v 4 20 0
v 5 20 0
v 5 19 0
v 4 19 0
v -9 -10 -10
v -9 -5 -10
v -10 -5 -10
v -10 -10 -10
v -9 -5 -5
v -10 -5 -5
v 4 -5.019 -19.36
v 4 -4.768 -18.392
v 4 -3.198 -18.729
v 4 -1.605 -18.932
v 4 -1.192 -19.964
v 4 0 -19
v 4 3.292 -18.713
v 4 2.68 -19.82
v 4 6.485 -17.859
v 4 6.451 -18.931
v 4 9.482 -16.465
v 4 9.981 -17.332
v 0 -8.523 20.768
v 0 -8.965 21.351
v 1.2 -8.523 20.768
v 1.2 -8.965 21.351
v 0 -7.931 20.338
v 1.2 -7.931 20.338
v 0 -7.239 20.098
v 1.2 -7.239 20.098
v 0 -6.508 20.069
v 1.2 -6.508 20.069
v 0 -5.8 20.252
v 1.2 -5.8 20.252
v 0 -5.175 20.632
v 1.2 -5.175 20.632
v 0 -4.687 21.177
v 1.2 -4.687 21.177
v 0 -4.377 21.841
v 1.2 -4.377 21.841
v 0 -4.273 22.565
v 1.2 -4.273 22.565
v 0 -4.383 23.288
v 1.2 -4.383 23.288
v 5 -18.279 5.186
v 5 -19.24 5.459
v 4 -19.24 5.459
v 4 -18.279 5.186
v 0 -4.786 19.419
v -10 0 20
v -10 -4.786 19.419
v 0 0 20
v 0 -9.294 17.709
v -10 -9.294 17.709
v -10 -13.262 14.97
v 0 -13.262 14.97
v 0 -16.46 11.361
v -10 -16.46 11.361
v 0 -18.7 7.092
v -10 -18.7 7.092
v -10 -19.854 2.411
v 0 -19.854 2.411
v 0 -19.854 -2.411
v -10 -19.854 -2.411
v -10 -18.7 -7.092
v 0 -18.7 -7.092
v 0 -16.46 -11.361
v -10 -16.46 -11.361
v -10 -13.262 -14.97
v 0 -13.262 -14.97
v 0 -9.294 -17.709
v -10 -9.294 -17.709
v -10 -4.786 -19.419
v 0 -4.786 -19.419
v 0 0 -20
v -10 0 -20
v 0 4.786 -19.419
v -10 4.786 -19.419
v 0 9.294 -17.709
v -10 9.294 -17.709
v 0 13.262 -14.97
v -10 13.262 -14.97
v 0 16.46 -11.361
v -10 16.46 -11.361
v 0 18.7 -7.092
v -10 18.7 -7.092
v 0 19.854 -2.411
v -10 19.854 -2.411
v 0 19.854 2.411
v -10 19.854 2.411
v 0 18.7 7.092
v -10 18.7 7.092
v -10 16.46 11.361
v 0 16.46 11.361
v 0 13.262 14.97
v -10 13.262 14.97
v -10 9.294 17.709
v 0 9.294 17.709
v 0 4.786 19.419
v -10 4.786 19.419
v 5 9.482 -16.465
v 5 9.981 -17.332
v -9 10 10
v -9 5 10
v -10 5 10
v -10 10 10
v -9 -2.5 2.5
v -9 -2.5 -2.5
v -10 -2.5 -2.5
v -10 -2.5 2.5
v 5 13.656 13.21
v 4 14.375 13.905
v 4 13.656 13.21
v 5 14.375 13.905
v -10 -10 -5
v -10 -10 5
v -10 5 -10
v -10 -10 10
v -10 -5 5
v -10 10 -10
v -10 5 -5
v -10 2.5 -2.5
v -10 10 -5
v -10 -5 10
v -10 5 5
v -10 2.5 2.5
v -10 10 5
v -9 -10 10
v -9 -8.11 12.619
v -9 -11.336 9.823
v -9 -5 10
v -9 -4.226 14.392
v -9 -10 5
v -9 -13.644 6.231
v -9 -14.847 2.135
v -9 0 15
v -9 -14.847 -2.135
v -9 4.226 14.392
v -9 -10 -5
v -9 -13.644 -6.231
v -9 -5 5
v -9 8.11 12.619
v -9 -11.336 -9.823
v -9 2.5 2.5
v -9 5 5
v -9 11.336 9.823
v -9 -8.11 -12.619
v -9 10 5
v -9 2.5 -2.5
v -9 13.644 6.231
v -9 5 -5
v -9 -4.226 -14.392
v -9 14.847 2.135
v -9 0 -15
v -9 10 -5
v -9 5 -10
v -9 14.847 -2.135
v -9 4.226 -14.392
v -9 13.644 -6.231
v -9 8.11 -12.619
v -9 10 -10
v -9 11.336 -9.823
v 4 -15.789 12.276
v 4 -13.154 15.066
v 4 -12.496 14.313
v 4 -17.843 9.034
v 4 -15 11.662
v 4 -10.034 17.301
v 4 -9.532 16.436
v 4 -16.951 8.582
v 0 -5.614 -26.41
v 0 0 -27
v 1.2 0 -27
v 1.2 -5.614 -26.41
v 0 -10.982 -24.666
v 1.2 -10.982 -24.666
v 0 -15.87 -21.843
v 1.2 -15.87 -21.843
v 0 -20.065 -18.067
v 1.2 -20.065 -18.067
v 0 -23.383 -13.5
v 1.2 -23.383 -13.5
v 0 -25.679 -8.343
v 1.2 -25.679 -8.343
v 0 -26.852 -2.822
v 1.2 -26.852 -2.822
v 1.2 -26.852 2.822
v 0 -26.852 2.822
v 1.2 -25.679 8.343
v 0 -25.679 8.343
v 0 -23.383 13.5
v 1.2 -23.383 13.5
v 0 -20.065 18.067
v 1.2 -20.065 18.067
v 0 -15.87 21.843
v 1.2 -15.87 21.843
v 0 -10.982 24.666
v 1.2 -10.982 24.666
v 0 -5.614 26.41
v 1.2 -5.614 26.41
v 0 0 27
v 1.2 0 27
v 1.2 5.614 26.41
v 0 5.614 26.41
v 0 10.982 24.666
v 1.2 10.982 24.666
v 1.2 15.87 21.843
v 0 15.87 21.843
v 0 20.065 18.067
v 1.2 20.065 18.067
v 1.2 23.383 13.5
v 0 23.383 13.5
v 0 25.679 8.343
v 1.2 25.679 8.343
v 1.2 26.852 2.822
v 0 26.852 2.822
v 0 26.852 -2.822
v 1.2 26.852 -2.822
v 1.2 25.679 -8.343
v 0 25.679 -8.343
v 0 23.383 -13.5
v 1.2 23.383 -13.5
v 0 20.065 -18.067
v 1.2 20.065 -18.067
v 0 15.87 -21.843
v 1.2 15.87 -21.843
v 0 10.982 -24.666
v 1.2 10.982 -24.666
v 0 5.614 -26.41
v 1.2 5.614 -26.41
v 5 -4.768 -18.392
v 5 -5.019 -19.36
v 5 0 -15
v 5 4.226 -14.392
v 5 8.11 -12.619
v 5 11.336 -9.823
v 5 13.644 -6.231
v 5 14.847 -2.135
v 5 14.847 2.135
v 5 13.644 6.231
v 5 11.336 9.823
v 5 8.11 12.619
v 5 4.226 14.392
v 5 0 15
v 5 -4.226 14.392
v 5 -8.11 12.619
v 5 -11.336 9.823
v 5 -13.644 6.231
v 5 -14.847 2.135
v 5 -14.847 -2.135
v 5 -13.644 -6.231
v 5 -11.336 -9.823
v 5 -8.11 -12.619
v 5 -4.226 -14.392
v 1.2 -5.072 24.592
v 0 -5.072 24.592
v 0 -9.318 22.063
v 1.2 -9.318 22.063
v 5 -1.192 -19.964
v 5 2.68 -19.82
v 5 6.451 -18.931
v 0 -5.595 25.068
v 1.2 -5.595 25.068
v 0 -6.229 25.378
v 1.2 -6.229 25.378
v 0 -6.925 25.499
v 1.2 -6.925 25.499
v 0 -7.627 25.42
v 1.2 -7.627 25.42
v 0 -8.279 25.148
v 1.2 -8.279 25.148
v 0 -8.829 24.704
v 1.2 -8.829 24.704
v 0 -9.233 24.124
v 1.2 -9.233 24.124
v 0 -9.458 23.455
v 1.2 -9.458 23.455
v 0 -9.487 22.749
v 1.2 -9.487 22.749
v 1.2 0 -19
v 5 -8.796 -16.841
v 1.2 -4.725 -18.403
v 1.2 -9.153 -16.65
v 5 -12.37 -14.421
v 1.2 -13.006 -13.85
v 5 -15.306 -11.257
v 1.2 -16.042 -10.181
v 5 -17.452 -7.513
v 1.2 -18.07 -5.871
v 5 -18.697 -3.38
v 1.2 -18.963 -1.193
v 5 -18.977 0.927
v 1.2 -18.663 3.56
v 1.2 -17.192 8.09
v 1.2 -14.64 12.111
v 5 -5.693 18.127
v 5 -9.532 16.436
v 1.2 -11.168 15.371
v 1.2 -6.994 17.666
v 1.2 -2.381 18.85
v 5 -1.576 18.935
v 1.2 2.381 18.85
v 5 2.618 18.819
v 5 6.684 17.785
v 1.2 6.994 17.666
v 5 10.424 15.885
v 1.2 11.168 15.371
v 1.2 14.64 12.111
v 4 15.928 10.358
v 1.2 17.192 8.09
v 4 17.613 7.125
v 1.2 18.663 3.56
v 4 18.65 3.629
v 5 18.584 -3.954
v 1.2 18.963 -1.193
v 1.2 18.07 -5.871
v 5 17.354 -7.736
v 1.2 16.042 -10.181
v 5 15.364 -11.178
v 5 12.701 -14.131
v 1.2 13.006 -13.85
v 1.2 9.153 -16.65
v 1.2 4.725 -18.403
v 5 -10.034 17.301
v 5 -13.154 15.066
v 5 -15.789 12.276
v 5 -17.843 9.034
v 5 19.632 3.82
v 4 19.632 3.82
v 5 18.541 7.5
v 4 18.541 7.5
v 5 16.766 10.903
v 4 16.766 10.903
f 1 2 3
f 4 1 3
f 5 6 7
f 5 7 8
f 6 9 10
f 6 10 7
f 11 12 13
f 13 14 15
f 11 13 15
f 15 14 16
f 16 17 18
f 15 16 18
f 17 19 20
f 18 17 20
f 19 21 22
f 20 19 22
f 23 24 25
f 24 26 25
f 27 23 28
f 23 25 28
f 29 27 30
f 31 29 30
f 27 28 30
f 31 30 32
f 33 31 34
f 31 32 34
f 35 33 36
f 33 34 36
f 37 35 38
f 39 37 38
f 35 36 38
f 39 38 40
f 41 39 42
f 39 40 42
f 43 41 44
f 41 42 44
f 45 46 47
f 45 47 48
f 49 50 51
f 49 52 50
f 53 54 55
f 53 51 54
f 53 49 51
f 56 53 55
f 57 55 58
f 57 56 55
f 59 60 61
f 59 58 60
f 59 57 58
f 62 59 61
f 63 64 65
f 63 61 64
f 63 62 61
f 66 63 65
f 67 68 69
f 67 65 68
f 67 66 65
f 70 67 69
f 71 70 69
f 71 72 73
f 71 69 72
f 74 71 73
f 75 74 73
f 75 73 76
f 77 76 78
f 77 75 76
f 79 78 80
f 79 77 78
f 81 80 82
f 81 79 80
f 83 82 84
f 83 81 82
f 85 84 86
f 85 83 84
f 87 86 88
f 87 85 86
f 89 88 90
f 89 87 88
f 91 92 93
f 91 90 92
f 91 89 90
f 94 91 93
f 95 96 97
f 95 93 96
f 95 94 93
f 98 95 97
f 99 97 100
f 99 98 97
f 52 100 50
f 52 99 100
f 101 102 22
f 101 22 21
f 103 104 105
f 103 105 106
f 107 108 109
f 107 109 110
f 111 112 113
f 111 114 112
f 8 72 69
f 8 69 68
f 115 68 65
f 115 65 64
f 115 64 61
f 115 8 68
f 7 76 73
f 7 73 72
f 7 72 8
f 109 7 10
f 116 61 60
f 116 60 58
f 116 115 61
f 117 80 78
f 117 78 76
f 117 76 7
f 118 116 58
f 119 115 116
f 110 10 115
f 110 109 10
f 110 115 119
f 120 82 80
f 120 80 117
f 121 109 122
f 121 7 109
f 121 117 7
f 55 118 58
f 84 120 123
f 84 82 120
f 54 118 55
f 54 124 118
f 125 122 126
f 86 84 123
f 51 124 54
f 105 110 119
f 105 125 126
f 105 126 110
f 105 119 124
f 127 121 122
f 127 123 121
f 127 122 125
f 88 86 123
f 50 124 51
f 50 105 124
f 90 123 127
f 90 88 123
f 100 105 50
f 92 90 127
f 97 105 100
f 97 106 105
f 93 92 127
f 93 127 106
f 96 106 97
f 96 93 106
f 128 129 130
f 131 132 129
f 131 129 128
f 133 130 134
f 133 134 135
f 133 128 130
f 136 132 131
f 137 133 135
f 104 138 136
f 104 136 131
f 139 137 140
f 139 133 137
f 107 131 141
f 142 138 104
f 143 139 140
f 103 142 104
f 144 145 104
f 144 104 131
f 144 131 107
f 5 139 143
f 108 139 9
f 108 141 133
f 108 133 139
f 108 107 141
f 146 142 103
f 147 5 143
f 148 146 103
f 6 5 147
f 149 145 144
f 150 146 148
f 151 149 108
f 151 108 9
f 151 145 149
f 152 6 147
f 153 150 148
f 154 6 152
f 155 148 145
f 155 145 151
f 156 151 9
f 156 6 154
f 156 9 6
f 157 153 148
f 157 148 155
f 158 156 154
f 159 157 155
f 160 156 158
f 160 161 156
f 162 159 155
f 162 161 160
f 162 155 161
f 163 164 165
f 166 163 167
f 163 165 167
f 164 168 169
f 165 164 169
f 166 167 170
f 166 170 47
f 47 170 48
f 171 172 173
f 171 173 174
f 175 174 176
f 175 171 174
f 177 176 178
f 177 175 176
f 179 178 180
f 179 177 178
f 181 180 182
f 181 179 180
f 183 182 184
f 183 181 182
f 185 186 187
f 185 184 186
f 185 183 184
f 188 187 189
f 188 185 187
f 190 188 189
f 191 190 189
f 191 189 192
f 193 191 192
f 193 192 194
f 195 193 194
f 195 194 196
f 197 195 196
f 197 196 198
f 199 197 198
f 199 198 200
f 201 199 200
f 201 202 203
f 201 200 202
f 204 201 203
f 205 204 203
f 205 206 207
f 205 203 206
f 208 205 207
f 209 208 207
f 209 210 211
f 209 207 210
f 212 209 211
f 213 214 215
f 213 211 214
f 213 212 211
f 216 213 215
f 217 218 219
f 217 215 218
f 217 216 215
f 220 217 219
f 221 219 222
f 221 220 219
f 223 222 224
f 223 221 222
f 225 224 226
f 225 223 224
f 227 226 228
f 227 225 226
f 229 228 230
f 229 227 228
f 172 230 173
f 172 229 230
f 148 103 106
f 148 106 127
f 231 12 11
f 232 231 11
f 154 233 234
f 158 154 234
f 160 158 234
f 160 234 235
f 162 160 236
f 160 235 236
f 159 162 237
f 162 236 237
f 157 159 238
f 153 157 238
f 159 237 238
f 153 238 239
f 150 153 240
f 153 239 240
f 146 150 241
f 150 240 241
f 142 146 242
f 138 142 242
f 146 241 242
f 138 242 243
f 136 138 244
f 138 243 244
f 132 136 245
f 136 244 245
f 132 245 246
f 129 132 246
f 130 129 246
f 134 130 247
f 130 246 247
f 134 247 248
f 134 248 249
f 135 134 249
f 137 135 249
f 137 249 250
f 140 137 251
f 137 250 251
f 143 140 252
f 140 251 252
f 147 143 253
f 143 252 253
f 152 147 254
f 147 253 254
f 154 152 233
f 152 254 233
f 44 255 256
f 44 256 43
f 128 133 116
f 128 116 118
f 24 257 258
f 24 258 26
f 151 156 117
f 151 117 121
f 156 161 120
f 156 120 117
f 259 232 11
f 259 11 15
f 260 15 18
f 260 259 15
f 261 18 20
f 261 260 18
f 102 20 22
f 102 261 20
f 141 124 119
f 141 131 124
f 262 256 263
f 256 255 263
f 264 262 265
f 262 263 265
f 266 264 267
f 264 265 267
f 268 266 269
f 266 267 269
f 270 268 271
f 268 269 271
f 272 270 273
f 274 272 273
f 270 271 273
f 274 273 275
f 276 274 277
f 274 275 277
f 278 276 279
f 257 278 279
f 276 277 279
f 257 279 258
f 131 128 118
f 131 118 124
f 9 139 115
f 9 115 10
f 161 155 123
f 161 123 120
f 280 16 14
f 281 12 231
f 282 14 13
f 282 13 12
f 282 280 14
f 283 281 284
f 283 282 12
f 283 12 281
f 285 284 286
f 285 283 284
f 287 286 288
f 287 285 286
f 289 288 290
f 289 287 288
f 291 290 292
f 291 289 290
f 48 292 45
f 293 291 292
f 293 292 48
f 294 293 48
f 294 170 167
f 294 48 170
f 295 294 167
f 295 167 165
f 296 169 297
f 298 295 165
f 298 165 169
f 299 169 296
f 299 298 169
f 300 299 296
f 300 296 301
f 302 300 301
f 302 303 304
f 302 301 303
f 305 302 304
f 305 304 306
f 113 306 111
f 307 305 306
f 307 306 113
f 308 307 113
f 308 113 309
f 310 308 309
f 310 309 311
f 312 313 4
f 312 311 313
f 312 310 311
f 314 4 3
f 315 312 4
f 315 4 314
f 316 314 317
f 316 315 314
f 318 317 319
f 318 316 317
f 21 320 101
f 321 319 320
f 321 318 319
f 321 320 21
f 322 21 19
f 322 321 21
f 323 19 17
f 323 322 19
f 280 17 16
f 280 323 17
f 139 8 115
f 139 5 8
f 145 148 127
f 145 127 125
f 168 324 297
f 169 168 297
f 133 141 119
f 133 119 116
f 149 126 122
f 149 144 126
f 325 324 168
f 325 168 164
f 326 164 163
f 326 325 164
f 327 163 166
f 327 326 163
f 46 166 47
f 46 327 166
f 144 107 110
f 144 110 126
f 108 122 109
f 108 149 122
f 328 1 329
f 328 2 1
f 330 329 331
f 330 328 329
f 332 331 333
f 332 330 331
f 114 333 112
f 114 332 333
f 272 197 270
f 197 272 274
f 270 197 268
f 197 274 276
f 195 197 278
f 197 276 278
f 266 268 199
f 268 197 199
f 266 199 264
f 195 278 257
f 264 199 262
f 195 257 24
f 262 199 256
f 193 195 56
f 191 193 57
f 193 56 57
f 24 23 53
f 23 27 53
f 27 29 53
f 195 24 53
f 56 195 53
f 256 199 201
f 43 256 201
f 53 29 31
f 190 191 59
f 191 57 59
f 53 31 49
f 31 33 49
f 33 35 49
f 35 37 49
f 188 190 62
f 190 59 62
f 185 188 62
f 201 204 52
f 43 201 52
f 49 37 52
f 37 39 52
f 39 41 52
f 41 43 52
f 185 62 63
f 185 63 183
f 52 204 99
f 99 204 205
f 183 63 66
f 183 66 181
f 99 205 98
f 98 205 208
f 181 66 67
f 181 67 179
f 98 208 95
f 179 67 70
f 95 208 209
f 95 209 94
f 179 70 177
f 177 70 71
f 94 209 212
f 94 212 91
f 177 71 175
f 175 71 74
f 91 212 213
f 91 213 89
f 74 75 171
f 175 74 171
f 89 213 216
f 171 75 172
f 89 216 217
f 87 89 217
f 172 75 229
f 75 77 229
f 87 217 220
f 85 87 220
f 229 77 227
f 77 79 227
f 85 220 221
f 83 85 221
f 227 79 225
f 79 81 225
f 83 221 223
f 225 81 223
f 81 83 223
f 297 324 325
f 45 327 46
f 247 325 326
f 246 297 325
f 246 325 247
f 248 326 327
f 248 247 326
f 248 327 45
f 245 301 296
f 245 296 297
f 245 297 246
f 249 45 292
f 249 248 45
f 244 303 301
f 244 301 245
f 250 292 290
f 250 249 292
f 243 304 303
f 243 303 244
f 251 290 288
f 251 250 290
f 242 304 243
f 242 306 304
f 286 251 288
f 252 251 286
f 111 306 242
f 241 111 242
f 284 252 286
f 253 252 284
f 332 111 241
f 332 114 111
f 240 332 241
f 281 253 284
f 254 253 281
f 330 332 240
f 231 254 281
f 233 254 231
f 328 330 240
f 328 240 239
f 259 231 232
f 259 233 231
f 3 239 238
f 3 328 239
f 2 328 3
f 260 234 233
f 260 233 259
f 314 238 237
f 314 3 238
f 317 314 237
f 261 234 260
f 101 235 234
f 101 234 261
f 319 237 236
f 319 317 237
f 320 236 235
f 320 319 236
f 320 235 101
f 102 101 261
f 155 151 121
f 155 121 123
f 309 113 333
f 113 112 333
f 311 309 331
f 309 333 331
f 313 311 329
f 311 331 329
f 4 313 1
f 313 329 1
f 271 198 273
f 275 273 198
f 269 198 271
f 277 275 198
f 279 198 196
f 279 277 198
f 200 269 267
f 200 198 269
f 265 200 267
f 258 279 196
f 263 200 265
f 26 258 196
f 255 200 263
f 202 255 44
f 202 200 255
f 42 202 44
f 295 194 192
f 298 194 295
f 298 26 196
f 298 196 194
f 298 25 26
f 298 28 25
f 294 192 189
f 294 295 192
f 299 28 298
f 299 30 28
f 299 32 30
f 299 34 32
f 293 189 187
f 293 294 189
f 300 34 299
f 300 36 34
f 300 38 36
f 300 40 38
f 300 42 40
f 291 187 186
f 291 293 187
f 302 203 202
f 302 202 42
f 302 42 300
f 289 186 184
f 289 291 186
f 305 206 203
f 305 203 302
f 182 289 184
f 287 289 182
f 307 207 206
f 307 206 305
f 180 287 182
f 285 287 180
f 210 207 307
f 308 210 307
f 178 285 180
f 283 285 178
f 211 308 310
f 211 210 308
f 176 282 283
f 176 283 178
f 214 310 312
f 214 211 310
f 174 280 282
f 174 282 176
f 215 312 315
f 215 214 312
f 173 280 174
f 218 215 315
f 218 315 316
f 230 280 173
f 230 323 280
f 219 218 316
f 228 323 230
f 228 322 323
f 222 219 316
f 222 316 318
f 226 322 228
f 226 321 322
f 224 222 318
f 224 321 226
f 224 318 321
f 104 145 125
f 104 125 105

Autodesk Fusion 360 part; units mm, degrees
sketch "スケッチ1" plane through (0, 0, 0) normal (1, 0, 0) x (0, 0, -1)
  circle A0 centre (0, 0) radius 27
  dimension "d1" = 54
extrude "押し出し1" add sketch "スケッチ1" along normal blind 1.2
sketch "スケッチ2" plane through (1.2, 0, 0) normal (1, 0, 0) x (0, 0, -1)
  circle A0 centre (0, 0) radius 27
  circle A1 centre (0, 0) radius 19
  dimension "d4" = 38
extrude "押し出し2" add sketch "スケッチ2" along normal blind 3.8 contours A1
sketch "スケッチ7" plane through (5, 0, 0) normal (1, 0, 0) x (0, 0, -1)
  circle A0 centre (0, 0) radius 19
  arc A1 (0, 20) -> (-13.9054, 14.375) centre (0, 0) ccw
  arc A2 (-17.3011, -10.0336) -> (-5.4591, -19.2405) centre (0, 0) ccw
  arc A3 (19.3599, -5.0193) -> (17.3316, 9.9807) centre (0, 0) ccw
  line L0 (17.3316, 9.9807) -> (0, 0)
  line L1 (0, 0) -> (19.3599, -5.0193)
  line L2 (0, 20) -> (0, 0)
  line L3 (-13.9054, 14.375) -> (0, 0)
  line L4 (-17.3011, -10.0336) -> (0, 0)
  line L5 (-5.4591, -19.2405) -> (0, 0)
  dimension "d10" = 20
  dimension "d11" = 20
  dimension "d12" = 20
  dimension "d13" = 15
  dimension "d14" = 15
  dimension "d15" = 15
extrude "押し出し3" add sketch "スケッチ7" against normal blind 1 contours A0 A3 L0 L1 | A0 A1 L2 L3 | A0 A2 L4 L5
sketch "スケッチ12" plane through (1.2, 0, 0) normal (1, 0, 0) x (0, 0, -1)
  circle A0 centre (0, 0) radius 19
  circle A1 centre (0, 0) radius 27
  arc A2 (-24.592, -5.0724) -> (-22.0631, -9.3178) centre (-23, -7) ccw
  arc A3 (-21.3514, -8.9648) -> (-23.2882, -4.3834) centre (-22.5544, -6.7733) ccw
  line L0 (-22.0631, -9.3178) -> (-21.3514, -8.9648)
  line L1 (-24.592, -5.0724) -> (-23.2882, -4.3834)
  dimension "d38" = 2.5
  dimension "d39" = 2.5
  dimension "d62" = 0.5
  dimension "d63" = 1.476
extrude "押し出し10" cut sketch "スケッチ12" against normal blind 11 contours A2 A3 L0 L1
sketch "スケッチ8" plane through (0, 0, 0) normal (-1, 0, 0) x (0, 0, 1)
  circle A0 centre (0, 0) radius 27
  circle A1 centre (0, 0) radius 20
  arc A2 (23.2882, -4.3834) -> (21.3514, -8.9648) centre (22.5544, -6.7733) ccw
  line L0 (23.2882, -4.3834) -> (24.592, -5.0724)
  arc A3 (22.0631, -9.3178) -> (24.592, -5.0724) centre (23, -7) ccw
  line L1 (22.0631, -9.3178) -> (21.3514, -8.9648)
  dimension "d18" = 40
extrude "押し出し4" add sketch "スケッチ8" along normal blind 10 contours A1
sketch "スケッチ9" plane through (5, 0, 0) normal (1, 0, 0) x (0, 0, -1)
  arc A0 (16.465, 9.4817) -> (0, 19) centre (0, 0) ccw
  line L0 (0, 19) -> (0, 20)
  arc A1 (0, 20) -> (-13.9054, 14.375) centre (0, 0) ccw
  line L1 (-13.9054, 14.375) -> (-13.2101, 13.6563)
  arc A2 (-13.2101, 13.6563) -> (-16.436, -9.5319) centre (0, 0) ccw
  line L2 (-16.436, -9.5319) -> (-17.3011, -10.0336)
  arc A3 (-17.3011, -10.0336) -> (-5.4591, -19.2405) centre (0, 0) ccw
  line L3 (-5.4591, -19.2405) -> (-5.1861, -18.2785)
  arc A4 (-5.1861, -18.2785) -> (18.3919, -4.7683) centre (0, 0) ccw
  line L4 (18.3919, -4.7683) -> (19.3599, -5.0193)
  arc A5 (19.3599, -5.0193) -> (17.3316, 9.9807) centre (0, 0) ccw
  line L5 (17.3316, 9.9807) -> (16.465, 9.4817)
  circle A6 centre (0, 0) radius 15
  dimension "d21" = 30
extrude "押し出し5" cut sketch "スケッチ9" against normal blind 14 contours A6
sketch "スケッチ11" plane through (-9, 0, 0) normal (1, 0, 0) x (0, 0, -1)
  circle A0 centre (0, 0) radius 15
  line L0 (-2.5, 2.5) -> (2.5, 2.5)
  line L1 (2.5, 2.5) -> (2.5, -2.5)
  line L2 (2.5, -2.5) -> (-2.5, -2.5)
  line L3 (-2.5, -2.5) -> (-2.5, 2.5)
  line L4 (5, 10) -> (10, 10)
  line L5 (10, 10) -> (10, 5)
  line L6 (10, 5) -> (5, 5)
  line L7 (5, 5) -> (5, 10)
  line L8 (-10, 10) -> (-5, 10)
  line L9 (-5, 10) -> (-5, 5)
  line L10 (-5, 5) -> (-10, 5)
  line L11 (-10, 5) -> (-10, 10)
  line L12 (-10, -5) -> (-5, -5)
  line L13 (-5, -5) -> (-5, -10)
  line L14 (-5, -10) -> (-10, -10)
  line L15 (-10, -10) -> (-10, -5)
  line L16 (5, -5) -> (10, -5)
  line L17 (10, -5) -> (10, -10)
  line L18 (10, -10) -> (5, -10)
  line L19 (5, -10) -> (5, -5)
  dimension "d42" = 5
  dimension "d43" = 2.5
  dimension "d44" = 2.5
  dimension "d45" = 5
  dimension "d46" = 5
  dimension "d47" = 5
  dimension "d48" = 5
  dimension "d49" = 5
  dimension "d50" = 5
  dimension "d51" = 5
  dimension "d52" = 5
  dimension "d53" = 5
  dimension "d54" = 5
  dimension "d55" = 5
  dimension "d56" = 5
  dimension "d57" = 5
  dimension "d58" = 5
  dimension "d59" = 5
extrude "押し出し11" cut sketch "スケッチ11" against normal blind 5 contours L0 L1 L2 L3 | L4 L5 L6 L7 | L8 L9 L10 L11 | L12 L13 L14 L15 | L16 L17 L18 L19
